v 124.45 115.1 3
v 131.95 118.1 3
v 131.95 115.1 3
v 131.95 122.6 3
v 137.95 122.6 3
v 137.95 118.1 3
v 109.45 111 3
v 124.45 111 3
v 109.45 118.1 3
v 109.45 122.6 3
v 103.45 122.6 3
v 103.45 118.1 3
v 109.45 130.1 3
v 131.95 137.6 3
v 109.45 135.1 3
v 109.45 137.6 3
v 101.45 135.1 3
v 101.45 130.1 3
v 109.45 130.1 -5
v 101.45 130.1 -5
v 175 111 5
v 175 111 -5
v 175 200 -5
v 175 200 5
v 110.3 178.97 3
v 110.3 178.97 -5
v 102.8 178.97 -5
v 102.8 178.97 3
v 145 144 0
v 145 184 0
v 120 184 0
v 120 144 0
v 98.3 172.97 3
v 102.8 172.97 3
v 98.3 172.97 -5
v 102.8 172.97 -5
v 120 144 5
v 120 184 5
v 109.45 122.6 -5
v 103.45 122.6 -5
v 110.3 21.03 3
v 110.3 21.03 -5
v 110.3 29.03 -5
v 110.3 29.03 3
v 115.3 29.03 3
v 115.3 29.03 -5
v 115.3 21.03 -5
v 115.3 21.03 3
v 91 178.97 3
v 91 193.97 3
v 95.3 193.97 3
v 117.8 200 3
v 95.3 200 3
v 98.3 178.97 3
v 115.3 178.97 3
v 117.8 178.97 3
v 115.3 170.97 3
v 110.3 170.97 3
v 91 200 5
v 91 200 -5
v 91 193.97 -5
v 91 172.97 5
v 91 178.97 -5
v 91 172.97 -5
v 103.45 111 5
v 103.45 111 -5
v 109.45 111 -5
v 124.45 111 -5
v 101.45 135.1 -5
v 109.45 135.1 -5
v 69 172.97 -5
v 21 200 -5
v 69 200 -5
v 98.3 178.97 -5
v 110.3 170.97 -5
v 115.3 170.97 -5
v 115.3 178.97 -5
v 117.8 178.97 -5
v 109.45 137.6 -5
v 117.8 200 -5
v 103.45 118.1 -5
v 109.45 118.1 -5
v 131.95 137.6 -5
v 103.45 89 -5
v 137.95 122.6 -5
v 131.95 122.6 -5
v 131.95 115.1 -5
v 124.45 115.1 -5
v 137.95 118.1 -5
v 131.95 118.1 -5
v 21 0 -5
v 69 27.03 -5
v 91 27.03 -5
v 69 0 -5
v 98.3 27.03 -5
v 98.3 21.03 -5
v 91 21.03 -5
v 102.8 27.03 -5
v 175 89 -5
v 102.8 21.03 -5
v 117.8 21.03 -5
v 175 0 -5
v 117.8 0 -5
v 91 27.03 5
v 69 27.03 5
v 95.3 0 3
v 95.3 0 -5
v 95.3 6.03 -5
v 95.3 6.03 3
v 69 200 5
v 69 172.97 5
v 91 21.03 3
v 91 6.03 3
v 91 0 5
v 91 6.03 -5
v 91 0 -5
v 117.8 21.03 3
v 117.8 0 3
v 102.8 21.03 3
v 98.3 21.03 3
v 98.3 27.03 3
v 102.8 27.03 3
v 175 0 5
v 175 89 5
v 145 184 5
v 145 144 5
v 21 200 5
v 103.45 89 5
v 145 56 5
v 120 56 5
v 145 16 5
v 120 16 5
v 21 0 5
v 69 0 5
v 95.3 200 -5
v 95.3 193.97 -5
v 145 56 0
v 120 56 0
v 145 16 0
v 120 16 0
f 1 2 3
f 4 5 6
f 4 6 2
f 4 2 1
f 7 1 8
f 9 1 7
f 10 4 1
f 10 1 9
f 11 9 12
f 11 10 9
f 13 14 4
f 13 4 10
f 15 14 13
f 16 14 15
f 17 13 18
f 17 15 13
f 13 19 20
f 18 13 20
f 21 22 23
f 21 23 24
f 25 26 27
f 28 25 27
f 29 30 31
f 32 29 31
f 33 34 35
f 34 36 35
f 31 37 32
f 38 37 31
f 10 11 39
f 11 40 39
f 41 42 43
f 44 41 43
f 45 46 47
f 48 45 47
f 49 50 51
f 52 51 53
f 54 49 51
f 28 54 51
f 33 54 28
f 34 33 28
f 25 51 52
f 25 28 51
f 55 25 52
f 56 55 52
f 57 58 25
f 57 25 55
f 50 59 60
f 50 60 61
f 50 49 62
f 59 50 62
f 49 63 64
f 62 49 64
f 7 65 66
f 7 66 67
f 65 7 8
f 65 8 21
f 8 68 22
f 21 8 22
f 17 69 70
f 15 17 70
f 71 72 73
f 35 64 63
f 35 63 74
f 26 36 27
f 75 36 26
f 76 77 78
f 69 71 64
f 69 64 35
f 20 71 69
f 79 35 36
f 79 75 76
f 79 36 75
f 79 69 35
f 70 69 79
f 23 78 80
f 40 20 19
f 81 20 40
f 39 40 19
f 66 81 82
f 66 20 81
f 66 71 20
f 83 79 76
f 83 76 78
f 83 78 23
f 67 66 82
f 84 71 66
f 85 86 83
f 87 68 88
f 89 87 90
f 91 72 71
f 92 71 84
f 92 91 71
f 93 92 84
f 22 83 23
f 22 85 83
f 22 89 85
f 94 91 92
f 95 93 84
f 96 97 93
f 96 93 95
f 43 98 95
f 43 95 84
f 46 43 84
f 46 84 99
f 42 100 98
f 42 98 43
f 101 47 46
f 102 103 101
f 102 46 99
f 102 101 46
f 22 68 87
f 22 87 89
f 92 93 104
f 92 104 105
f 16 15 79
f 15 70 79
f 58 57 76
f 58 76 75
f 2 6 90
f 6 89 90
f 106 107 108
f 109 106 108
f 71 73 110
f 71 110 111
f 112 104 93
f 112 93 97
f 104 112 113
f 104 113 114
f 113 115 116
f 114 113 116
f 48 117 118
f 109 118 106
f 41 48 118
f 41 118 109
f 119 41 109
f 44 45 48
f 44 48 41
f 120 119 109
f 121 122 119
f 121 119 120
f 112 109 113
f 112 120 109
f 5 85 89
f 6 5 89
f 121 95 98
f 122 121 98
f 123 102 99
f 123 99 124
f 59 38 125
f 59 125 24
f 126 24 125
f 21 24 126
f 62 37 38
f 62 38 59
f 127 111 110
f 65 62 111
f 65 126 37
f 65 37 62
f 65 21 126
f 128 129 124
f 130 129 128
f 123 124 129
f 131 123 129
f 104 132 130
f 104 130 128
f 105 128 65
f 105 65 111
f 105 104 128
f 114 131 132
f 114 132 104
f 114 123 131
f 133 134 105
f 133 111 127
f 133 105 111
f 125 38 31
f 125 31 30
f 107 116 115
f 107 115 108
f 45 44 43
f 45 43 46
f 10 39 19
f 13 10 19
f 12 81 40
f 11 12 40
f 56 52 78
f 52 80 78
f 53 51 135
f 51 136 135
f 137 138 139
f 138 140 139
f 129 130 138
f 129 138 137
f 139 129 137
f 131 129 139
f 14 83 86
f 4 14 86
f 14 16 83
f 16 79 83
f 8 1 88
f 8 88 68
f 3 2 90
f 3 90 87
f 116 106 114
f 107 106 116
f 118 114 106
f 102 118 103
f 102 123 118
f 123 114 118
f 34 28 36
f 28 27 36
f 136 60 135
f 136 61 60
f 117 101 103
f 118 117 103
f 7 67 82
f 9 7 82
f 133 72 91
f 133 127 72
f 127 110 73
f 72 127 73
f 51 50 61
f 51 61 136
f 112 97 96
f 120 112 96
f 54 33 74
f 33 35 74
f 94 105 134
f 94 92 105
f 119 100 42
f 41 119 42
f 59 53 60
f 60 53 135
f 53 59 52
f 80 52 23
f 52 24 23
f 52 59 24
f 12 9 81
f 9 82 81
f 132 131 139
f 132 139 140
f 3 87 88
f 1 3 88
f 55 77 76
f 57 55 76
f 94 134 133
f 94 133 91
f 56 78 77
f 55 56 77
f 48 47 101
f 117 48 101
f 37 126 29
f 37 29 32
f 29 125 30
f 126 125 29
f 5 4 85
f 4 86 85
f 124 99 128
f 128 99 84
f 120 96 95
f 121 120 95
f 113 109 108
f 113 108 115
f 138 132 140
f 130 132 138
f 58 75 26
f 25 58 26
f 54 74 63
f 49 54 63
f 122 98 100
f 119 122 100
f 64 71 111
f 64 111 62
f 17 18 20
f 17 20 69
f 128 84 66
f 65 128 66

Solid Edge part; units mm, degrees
sketch "Sketch1" plane through (0, 0, 0) normal (0, -1, 0) x (1, 0, 0)
  line L0 (-175, -5) -> (175, -5)
  line L1 (175, -5) -> (175, 5)
  line L2 (175, 5) -> (-175, 5)
  line L3 (-175, 5) -> (-175, -5)
  dimension "D1" = 350
  dimension "D2" = 10
extrude "Protrusion1" add sketch "Sketch1" against normal blind 200
sketch "Sketch2" plane through (0, 100, -5) normal (0, 0, -1) x (1, 0, 0)
  line L0 (-22.8, 78.97) -> (-22.8, 72.97)
  line L1 (-22.8, 72.97) -> (-18.3, 72.97)
  line L2 (-18.3, 72.97) -> (-18.3, 78.97)
  line L3 (-18.3, 78.97) -> (-15.3, 78.97)
  line L4 (-15.3, 78.97) -> (-10.3, 78.97)
  line L5 (-10.3, 78.97) -> (-10.3, 93.97)
  line L6 (-10.3, 93.97) -> (-15.3, 93.97)
  line L7 (-15.3, 93.97) -> (-15.3, 101.97)
  line L8 (-15.3, 101.97) -> (-18.3, 101.97)
  line L9 (-18.3, 101.97) -> (-18.3, 107.97)
  line L10 (-18.3, 107.97) -> (-22.8, 107.97)
  line L11 (-22.8, 107.97) -> (-22.8, 101.97)
  line L12 (-22.8, 101.97) -> (-37.8, 101.97)
  line L13 (-37.8, 101.97) -> (-37.8, 78.97)
  line L14 (-37.8, 78.97) -> (-35.3, 78.97)
  line L15 (-35.3, 78.97) -> (-35.3, 70.97)
  line L16 (-35.3, 70.97) -> (-30.3, 70.97)
  line L17 (-30.3, 70.97) -> (-30.3, 78.97)
  line L18 (-30.3, 78.97) -> (-22.8, 78.97)
  dimension "D1" = 23
  dimension "D2" = 6
  dimension "D3" = 3
  dimension "D4" = 5
  dimension "D5" = 22.5
  dimension "D6" = 15
  dimension "D7" = 1.97
  dimension "D8" = 10.3
  dimension "D9" = 15
  dimension "D10" = 8
  dimension "D11" = 5
  dimension "D12" = 2.5
extrude "Cutout1" cut sketch "Sketch2" against normal blind 8
sketch "Sketch3" plane through (0, 100, -5) normal (0, 0, -1) x (1, 0, 0)
  line L0 (11, 72.97) -> (-11, 72.97)
  line L1 (-11, 111.97) -> (-11, 72.97)
  line L2 (11, 111.97) -> (-11, 111.97)
  line L3 (11, 111.97) -> (11, 72.97)
  dimension "D1" = 22
  dimension "D2" = 0.7
  dimension "D3" = 39
  dimension "D4" = 6
extrude "Cutout2" cut sketch "Sketch3" against normal through all
mirror "Mirror1" about plane through (0, 100, 0) normal (0, -1, 0) of "Cutout1", "Cutout2"
mirror "Mirror2" about plane through (40, 0, 0) normal (1, 0, 0) of "Mirror1", "Cutout2", "Cutout1"
mirror "Mirror3" about plane through (-40, 0, 0) normal (1, 0, 0) of "Cutout2", "Cutout1", "Mirror1"
sketch "Sketch4" plane through (0, 100, -5) normal (0, 0, -1) x (0, -1, 0)
  line L0 (-22.6, 109.45) -> (-22.6, 103.45)
  line L1 (-22.6, 103.45) -> (-18.1, 103.45)
  line L2 (-18.1, 103.45) -> (-18.1, 109.45)
  line L3 (-18.1, 109.45) -> (-15.1, 109.45)
  line L4 (-15.1, 109.45) -> (-11, 109.45)
  line L5 (-11, 109.45) -> (-11, 124.45)
  line L6 (-11, 124.45) -> (-15.1, 124.45)
  line L7 (-15.1, 124.45) -> (-15.1, 131.95)
  line L8 (-15.1, 131.95) -> (-18.1, 131.95)
  line L9 (-18.1, 131.95) -> (-18.1, 137.95)
  line L10 (-18.1, 137.95) -> (-22.6, 137.95)
  line L11 (-22.6, 137.95) -> (-22.6, 131.95)
  line L12 (-22.6, 131.95) -> (-37.6, 131.95)
  line L13 (-37.6, 131.95) -> (-37.6, 109.45)
  line L14 (-37.6, 109.45) -> (-35.1, 109.45)
  line L15 (-35.1, 109.45) -> (-35.1, 101.45)
  line L16 (-35.1, 101.45) -> (-30.1, 101.45)
  line L17 (-30.1, 101.45) -> (-30.1, 109.45)
  line L18 (-30.1, 109.45) -> (-22.6, 109.45)
  dimension "D1" = 6
  dimension "D2" = 3
  dimension "D3" = 4.1
  dimension "D4" = 22.5
  dimension "D5" = 15
  dimension "D6" = 22.5
  dimension "D7" = 103.45
  dimension "D8" = 11
  dimension "D9" = 15
  dimension "D10" = 8
  dimension "D11" = 5
  dimension "D12" = 2.5
  dimension "D13" = 15
extrude "Cutout3" cut sketch "Sketch4" against normal up to vertex (8 mm away)
sketch "Sketch5" plane through (0, 100, -5) normal (0, 0, -1) x (0, -1, 0)
  line L0 (-11, 109.45) -> (-11, 103.45)
  line L1 (-11, 103.45) -> (11, 103.45)
  line L2 (11, 103.45) -> (11, 175)
  line L3 (11, 175) -> (-11, 175)
  line L4 (-11, 175) -> (-11, 109.45)
  dimension "D1" = 6
  dimension "D2" = 22
extrude "Cutout4" cut sketch "Sketch5" against normal through all
mirror "Mirror4" about plane through (0, 0, 0) normal (1, 0, 0) of "Cutout4", "Cutout3"
sketch "Sketch6" plane through (0, 100, -5) normal (0, 0, -1) x (1, 0, 0)
  circle A0 centre (-97.5, 62.5) radius 1.875
  circle A1 centre (-52.5, 62.5) radius 1.875
  circle A2 centre (-52.5, 0) radius 1.875
  circle A3 centre (-97.5, -62.5) radius 1.875
  circle A4 centre (-52.5, -62.5) radius 1.875
  dimension "D1" = 195
  dimension "D2" = 125
  dimension "D3" = 3.75
  dimension "D4" = 45
extrude "Cutout5" cut sketch "Sketch6" against normal blind 7
sketch "Sketch7" plane through (0, 100, 5) normal (0, 0, 1) x (1, 0, 0)
  line L0 (-120, 84) -> (-120, 44)
  line L1 (-120, 44) -> (-145, 44)
  line L2 (-145, 44) -> (-145, 84)
  line L3 (-145, 84) -> (-120, 84)
  dimension "D1" = 40
  dimension "D2" = 25
  dimension "D3" = 15
  dimension "D4" = 30
extrude "Cutout6" cut sketch "Sketch7" against normal blind 5
mirror "Mirror5" about plane through (0, 100, 0) normal (0, -1, 0) of "Cutout6"
mirror "Mirror6" about plane through (0, 0, 0) normal (1, 0, 0) of "Cutout6", "Mirror5"
sketch "Sketch8" plane through (0, 100, 5) normal (0, 0, 1) x (1, 0, 0)
  line L0 (21, 100) -> (21, -100)
  dimension "D1" = 10
extrude "Cutout7" cut sketch "Sketch8" against normal through all material side at (20.95, 100, 5)
properties material "Nylon, allgemein"
